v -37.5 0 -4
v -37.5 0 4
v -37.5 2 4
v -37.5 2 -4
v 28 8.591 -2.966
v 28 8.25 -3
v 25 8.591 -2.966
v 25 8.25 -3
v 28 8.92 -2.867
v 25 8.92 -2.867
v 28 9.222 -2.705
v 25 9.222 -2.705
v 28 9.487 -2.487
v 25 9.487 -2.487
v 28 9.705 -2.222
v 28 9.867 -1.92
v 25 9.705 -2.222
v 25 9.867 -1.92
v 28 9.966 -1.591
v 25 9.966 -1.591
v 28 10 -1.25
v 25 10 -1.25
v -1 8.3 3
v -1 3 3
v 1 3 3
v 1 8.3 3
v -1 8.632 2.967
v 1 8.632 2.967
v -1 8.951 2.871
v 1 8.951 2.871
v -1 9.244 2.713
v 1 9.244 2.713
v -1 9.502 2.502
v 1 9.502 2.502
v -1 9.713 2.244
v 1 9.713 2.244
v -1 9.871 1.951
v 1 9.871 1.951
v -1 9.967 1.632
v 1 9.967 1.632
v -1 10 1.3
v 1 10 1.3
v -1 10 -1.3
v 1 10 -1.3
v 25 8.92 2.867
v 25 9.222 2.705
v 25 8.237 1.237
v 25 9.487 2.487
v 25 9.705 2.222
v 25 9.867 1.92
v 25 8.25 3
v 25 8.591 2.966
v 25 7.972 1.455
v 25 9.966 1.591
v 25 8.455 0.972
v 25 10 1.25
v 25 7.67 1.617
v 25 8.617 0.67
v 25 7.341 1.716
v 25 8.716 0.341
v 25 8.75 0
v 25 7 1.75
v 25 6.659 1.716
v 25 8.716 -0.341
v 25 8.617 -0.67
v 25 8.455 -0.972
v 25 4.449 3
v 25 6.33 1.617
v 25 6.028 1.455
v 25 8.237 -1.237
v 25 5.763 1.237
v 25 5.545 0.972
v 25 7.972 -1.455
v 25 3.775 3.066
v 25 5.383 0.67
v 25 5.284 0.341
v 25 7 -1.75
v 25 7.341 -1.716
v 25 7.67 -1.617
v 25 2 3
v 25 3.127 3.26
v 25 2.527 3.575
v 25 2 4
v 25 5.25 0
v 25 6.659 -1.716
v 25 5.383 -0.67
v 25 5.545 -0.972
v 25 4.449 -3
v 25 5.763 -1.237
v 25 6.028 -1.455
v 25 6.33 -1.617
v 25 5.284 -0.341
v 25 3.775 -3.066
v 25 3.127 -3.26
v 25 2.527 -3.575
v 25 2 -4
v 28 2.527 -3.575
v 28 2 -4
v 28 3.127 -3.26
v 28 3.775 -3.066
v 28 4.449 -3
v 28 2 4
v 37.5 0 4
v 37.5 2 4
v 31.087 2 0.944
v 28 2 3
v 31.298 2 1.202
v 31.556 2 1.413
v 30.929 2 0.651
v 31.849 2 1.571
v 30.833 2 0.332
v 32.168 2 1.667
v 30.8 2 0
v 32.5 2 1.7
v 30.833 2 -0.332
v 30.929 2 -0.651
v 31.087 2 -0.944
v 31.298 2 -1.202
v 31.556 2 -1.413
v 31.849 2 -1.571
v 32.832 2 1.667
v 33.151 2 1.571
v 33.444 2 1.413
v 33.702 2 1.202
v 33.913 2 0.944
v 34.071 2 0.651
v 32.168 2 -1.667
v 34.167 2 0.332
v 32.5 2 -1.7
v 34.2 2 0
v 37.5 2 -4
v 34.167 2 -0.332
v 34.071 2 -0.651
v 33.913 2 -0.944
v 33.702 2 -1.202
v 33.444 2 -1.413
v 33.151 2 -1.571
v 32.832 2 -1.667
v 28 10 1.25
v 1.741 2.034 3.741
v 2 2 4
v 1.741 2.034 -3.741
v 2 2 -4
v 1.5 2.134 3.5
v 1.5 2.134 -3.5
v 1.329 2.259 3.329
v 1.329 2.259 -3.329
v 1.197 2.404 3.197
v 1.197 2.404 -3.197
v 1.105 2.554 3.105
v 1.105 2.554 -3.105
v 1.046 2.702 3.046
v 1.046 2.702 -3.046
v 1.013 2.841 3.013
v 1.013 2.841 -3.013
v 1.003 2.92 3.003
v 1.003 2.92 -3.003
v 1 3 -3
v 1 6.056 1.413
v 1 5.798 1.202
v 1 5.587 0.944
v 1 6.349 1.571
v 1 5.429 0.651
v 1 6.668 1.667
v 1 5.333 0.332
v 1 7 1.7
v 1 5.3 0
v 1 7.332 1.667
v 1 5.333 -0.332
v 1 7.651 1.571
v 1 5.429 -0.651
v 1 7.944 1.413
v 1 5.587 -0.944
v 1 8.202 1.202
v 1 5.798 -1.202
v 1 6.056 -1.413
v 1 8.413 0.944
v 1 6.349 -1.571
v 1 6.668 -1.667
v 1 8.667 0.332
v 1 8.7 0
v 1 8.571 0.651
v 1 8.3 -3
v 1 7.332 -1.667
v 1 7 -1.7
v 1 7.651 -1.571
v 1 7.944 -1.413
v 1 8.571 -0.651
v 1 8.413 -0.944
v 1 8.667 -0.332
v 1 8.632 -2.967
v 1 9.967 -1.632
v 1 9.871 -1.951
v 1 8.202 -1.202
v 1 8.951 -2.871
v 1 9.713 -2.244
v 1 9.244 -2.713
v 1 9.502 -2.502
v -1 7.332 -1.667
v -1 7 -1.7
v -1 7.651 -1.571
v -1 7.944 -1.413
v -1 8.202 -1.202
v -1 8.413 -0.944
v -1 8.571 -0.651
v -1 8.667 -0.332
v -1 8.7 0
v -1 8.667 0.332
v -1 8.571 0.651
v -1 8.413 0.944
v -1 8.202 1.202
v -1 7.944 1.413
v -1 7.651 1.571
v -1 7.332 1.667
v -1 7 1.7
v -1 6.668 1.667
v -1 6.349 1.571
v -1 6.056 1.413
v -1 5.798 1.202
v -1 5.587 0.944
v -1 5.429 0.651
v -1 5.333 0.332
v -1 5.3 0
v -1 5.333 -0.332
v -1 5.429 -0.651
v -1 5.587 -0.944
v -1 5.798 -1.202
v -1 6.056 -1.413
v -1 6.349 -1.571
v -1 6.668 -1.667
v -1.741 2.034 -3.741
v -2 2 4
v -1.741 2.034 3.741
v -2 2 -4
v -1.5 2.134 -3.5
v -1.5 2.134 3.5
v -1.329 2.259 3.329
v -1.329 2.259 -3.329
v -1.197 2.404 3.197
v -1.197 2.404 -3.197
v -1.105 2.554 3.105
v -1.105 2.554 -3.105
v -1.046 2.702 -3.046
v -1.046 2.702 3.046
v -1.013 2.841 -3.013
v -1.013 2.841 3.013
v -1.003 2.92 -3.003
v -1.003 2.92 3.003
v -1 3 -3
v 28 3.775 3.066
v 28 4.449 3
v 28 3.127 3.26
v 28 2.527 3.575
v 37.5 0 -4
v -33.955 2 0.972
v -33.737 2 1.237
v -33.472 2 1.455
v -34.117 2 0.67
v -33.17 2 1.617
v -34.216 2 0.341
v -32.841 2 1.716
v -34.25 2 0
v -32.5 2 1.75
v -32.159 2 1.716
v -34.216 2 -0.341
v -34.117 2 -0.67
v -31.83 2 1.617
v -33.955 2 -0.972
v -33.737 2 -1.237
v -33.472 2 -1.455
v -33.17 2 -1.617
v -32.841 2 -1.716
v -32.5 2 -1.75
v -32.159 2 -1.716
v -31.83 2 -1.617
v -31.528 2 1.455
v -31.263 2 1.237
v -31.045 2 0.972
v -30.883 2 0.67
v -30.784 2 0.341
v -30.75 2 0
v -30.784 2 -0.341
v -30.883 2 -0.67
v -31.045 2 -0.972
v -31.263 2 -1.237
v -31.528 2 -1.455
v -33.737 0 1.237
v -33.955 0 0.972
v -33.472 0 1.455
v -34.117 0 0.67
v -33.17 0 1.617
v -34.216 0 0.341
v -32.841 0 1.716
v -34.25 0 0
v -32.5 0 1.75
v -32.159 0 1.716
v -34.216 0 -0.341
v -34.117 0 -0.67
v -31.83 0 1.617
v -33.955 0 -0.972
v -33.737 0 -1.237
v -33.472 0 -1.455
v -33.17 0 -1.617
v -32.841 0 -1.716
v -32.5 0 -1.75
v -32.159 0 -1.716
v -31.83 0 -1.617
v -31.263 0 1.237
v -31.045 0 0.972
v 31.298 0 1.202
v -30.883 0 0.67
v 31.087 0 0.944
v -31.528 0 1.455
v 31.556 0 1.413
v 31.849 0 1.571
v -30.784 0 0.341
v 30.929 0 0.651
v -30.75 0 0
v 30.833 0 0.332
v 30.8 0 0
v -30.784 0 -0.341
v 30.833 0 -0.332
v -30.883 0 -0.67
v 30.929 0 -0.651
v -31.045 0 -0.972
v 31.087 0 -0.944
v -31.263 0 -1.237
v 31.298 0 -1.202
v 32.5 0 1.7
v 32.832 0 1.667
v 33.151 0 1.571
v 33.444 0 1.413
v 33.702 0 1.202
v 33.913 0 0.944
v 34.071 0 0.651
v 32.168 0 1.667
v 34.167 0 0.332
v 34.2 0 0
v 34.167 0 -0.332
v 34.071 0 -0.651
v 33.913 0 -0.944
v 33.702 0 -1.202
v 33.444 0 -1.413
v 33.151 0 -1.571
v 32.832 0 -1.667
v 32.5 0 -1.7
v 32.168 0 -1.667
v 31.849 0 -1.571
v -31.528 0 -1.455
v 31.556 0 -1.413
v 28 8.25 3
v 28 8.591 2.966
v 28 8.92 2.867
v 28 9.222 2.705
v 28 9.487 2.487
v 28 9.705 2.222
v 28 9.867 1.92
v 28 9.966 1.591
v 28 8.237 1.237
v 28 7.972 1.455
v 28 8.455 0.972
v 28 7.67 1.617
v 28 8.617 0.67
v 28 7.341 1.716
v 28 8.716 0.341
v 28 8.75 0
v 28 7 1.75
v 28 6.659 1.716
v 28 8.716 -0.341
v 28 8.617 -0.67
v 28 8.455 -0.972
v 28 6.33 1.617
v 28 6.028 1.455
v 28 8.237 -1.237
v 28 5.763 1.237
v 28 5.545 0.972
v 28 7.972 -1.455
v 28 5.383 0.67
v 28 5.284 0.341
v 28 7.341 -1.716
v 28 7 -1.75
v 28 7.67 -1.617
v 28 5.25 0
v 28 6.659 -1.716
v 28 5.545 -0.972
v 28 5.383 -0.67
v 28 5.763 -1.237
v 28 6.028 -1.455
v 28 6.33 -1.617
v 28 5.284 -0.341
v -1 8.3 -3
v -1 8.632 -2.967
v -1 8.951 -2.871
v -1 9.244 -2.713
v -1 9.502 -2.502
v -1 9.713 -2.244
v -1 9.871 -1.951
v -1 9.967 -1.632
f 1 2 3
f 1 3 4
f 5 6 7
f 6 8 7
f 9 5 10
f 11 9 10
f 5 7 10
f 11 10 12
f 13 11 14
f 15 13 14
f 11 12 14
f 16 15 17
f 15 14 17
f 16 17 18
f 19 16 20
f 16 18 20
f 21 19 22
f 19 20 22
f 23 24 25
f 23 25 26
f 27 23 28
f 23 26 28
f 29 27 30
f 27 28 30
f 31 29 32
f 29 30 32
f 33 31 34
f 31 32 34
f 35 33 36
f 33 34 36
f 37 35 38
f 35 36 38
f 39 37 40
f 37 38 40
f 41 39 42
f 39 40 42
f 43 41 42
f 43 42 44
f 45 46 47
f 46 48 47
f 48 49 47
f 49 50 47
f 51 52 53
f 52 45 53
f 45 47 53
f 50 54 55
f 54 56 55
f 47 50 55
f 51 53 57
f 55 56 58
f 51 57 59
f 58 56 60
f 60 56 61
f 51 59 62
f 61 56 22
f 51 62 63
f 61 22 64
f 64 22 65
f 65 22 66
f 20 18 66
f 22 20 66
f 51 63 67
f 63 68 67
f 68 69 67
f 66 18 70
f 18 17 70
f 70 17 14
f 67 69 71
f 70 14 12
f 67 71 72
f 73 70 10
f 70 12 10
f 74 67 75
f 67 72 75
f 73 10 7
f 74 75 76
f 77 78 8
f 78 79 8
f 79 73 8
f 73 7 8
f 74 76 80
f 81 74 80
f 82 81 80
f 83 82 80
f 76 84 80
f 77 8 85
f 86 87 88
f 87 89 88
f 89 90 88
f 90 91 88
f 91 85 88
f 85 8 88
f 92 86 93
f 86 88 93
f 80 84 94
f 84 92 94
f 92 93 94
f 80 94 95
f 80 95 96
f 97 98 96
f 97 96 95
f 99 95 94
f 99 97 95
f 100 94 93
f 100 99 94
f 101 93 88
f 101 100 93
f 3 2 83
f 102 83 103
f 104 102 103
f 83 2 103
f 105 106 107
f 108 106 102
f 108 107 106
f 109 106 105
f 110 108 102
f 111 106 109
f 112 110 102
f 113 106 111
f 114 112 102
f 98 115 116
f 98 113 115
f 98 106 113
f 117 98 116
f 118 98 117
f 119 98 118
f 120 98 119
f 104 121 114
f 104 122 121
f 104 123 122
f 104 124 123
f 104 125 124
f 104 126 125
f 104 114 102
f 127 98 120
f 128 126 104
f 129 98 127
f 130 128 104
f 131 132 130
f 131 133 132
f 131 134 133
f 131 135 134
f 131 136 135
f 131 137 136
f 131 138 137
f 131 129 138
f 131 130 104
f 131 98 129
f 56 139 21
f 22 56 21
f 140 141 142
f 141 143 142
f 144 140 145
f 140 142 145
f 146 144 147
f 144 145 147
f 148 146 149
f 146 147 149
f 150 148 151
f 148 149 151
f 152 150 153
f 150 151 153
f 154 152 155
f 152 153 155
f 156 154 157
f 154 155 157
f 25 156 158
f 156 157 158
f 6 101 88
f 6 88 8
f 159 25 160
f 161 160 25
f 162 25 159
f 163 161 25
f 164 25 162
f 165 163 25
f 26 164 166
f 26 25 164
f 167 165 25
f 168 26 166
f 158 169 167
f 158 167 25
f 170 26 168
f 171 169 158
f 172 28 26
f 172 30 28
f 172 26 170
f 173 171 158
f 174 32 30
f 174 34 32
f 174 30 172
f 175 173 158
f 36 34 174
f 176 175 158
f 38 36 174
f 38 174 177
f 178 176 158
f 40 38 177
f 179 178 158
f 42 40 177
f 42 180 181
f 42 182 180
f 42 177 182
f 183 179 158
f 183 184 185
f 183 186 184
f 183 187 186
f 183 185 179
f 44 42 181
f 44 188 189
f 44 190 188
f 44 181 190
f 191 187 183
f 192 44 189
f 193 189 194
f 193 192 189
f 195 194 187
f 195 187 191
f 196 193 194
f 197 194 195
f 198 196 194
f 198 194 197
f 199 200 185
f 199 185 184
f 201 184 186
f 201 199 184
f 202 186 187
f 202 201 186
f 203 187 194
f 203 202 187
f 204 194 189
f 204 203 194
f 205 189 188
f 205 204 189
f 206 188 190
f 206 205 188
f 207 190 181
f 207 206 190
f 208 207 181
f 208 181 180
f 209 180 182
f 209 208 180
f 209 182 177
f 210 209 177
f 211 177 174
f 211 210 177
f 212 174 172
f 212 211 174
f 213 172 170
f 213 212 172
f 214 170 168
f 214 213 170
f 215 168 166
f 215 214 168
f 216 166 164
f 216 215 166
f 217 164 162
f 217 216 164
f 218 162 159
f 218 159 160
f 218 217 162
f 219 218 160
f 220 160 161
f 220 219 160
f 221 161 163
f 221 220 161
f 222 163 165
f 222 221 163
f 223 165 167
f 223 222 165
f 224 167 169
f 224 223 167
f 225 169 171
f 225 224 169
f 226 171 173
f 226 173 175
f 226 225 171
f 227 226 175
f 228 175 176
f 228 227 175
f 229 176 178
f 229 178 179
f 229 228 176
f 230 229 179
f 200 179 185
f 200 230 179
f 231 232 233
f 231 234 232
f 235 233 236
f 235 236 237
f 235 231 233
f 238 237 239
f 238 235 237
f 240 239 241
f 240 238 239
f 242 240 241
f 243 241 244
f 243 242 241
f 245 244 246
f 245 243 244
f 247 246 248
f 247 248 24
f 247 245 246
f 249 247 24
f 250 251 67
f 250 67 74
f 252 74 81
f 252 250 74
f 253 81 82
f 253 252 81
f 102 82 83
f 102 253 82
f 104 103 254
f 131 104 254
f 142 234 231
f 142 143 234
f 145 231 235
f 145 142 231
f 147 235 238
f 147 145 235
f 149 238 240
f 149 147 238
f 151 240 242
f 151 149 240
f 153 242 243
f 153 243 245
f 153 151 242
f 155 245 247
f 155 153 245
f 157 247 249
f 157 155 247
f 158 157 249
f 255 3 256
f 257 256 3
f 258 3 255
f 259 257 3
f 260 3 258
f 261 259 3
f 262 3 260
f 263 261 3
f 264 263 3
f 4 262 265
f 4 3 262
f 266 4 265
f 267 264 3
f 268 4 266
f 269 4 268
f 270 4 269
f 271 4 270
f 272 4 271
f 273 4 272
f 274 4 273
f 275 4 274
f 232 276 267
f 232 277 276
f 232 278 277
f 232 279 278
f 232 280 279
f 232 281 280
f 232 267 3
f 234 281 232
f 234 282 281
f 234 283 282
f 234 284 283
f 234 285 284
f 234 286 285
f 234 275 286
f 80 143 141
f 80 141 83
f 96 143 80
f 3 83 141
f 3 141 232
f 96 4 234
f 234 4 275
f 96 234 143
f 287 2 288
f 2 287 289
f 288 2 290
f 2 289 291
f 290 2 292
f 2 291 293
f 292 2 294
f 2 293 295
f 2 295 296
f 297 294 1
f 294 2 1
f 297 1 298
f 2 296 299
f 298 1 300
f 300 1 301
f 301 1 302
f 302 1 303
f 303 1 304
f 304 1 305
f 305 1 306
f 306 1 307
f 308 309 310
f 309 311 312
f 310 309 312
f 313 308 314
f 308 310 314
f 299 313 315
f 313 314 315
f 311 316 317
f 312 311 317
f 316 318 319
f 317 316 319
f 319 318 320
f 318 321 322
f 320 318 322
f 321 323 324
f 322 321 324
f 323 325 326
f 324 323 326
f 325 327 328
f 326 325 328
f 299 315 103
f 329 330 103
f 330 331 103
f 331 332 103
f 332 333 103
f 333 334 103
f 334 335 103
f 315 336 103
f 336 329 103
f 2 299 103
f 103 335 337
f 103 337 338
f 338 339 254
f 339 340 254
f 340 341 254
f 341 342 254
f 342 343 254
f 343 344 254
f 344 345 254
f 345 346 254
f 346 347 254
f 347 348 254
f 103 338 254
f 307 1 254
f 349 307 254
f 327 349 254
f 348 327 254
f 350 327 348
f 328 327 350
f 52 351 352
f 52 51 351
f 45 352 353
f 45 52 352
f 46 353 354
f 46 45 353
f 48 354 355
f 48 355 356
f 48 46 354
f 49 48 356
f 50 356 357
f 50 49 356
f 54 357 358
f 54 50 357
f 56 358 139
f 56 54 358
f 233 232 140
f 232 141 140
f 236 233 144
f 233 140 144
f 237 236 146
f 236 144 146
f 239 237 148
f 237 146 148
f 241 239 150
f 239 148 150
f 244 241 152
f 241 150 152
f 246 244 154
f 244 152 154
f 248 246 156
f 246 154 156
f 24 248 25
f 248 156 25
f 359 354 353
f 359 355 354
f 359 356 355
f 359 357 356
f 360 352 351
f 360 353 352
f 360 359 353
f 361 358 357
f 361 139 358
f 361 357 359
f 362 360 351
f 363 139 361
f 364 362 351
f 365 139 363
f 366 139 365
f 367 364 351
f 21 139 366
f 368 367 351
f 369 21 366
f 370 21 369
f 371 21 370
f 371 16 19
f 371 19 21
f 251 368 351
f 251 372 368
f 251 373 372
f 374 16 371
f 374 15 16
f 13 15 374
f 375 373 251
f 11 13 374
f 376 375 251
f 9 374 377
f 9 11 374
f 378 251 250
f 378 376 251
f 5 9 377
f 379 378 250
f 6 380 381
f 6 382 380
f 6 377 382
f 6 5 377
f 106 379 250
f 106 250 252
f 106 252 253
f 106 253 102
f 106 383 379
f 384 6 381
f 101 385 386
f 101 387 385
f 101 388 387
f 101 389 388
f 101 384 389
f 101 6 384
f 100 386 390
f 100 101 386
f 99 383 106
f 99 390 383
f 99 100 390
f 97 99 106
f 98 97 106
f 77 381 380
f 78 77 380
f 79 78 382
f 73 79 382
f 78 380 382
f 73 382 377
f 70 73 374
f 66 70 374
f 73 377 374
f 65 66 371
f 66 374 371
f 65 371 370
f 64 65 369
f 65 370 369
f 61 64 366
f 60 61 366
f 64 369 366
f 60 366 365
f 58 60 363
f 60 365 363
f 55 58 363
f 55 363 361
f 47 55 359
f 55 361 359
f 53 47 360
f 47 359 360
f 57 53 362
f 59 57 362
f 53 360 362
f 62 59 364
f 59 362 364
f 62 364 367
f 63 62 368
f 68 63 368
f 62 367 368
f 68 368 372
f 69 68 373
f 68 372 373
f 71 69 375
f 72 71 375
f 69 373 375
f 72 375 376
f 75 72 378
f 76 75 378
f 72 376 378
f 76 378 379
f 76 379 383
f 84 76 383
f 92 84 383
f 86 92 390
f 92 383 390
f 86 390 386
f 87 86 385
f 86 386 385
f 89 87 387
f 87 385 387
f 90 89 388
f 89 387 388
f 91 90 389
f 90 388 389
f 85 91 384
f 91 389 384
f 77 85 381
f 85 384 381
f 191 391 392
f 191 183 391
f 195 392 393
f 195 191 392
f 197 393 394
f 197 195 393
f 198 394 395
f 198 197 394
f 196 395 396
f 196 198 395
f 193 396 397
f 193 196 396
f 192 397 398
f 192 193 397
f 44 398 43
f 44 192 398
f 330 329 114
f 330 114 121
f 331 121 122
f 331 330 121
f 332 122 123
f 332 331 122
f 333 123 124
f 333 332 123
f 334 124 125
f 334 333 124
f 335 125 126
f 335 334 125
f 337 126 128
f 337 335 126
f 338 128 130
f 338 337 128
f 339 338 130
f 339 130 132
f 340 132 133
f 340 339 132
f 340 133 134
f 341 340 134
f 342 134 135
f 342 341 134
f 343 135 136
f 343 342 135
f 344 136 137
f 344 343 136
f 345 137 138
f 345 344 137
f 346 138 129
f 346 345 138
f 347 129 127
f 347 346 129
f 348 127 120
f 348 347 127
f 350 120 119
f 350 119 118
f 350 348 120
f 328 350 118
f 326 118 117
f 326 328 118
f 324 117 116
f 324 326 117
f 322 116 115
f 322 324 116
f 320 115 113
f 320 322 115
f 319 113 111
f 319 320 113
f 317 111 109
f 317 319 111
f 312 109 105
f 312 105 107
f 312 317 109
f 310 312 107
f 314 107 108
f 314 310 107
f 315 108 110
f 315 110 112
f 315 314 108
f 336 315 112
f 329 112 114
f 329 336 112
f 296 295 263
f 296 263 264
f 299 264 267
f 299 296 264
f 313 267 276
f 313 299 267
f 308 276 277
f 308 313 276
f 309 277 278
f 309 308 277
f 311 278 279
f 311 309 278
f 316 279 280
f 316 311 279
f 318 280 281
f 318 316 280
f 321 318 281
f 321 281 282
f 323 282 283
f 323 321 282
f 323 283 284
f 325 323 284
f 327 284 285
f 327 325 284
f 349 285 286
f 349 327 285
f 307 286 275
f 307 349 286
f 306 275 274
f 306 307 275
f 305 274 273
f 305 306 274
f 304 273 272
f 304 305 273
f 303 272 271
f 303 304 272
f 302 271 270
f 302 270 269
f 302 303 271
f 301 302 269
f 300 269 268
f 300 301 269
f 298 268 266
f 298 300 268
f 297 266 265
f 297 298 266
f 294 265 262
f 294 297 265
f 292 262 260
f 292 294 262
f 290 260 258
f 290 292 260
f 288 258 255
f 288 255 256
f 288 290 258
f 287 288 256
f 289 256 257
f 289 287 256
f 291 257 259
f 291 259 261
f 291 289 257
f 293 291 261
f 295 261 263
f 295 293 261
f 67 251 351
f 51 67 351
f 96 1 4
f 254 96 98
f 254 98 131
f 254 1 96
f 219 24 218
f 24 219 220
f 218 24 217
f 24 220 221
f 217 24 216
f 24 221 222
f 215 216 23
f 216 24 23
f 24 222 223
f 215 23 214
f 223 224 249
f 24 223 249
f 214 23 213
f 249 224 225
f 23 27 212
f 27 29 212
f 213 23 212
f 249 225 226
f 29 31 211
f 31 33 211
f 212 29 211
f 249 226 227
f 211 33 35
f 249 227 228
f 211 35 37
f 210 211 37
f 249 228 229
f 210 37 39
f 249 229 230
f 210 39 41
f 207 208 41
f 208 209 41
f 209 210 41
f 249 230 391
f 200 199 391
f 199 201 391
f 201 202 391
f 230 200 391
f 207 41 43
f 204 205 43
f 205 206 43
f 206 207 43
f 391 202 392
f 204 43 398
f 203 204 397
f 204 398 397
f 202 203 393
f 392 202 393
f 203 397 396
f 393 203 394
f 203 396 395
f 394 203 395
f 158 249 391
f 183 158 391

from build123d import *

# Parameters (mm, degrees)
SKETCH_1_W           = 75
SKETCH_1_H           = 8
SKETCH_1_R           = 1.75
SKETCH_1_R_2         = 1.7
EXTRUDE_1_DEPTH      = 2
EXTRUDE_2_DEPTH      = 1
EXTRUDE_2_DEPTH_BACK = 1
SKETCH_2_W           = 6
SKETCH_2_H           = 8
SKETCH_2_R           = 1.7
FILLET_2_R           = 1
FILLET_3_R           = 1.7
SKETCH_3_W           = 6
SKETCH_3_H           = 8
SKETCH_3_R           = 1.75
EXTRUDE_3_DEPTH      = 3
FILLET_6_R           = 1.75
FILLET_7_R           = 3.5


# Some blends are built 0.0001 mm under size
with BuildPart() as part:
    # 草图1 → 凸台-拉伸1 (new body)
    with BuildSketch(Plane(origin=(0, 0, 0), x_dir=(1, 0, 0), z_dir=(0, 1, 0))):
        Rectangle(SKETCH_1_W, SKETCH_1_H)
        with Locations(Location((-32.5, 0, 0), (0, 0, 270))):
            Circle(SKETCH_1_R, mode=Mode.SUBTRACT)
        with Locations(Location((32.5, 0, 0), (0, 0, 270))):
            Circle(SKETCH_1_R_2, mode=Mode.SUBTRACT)
    extrude(amount=EXTRUDE_1_DEPTH)

    # 草图2 → 凸台-拉伸2 (add, two sides: drawn at the far end of the back side and taken through both)
    with BuildSketch(Plane(origin=(0, 0, 0), x_dir=(0, 0, -1), z_dir=(1, 0, 0)).offset(-EXTRUDE_2_DEPTH_BACK)):
        with Locations((0, 6)):
            Rectangle(SKETCH_2_W, SKETCH_2_H)
        with Locations((0, 7)):
            Circle(SKETCH_2_R, mode=Mode.SUBTRACT)
    extrude(amount=EXTRUDE_2_DEPTH + EXTRUDE_2_DEPTH_BACK)

    # 圆角2
    fillet_2_edges = [part.edges().sort_by_distance(p)[0] for p in [
        (0, 2, -3),
        (-1, 2, 0),
        (0, 2, 3),
        (1, 2, 0),
    ]]
    fillet(fillet_2_edges, radius=FILLET_2_R - 0.0001)  # a hair under: the kernel refuses the full size

    # 圆角3
    fillet_3_edges = [part.edges().sort_by_distance(p)[0] for p in [
        (0, 10, -3),
        (0, 10, 3),
    ]]
    fillet(fillet_3_edges, radius=FILLET_3_R)

    # 草图3 → 凸台-拉伸3 (add)
    with BuildSketch(Plane(origin=(28, 0, 0), x_dir=(0, 0, -1), z_dir=(1, 0, 0))):
        with Locations((0, 6)):
            Rectangle(SKETCH_3_W, SKETCH_3_H)
        with Locations((0, 7)):
            Circle(SKETCH_3_R, mode=Mode.SUBTRACT)
    extrude(amount=-EXTRUDE_3_DEPTH)

    # 圆角6
    fillet_6_edges = [part.edges().sort_by_distance(p)[0] for p in [
        (26.5, 10, -3),
        (26.5, 10, 3),
    ]]
    fillet(fillet_6_edges, radius=FILLET_6_R)

    # 圆角7
    # the kernel refuses this fillet: 3.5 mm, written as the material it adds along each edge
    with BuildSketch(Plane(origin=(28, 2, -3), x_dir=(0, 0, -1), z_dir=(-1, 0, 0))) as fillet_7_piece_1:
        with BuildLine():
            CenterArc((3.5, -2.449489743), FILLET_7_R, 135.584691403, 44.415308597)
            Line((0, -2.449489743), (-0.07, -2.449489743))
            Line((-0.07, -2.449489743), (-0.07, 0))
            Line((-0.07, 0), (0, 0.07))
            ThreePointArc((0, 0.07), (0.5, 0.07), (0.95, 0.048989795))
            Line((0.95, 0.048989795), (1, 0))
        make_face()
    extrude(amount=3)
    with BuildSketch(Plane(origin=(28, 2, 3), x_dir=(0, 1, 0), z_dir=(-1, 0, 0))) as fillet_7_piece_2:
        with BuildLine():
            CenterArc((2.449489743, -3.5), FILLET_7_R, 90, 44.415308597)
            Line((0, -1), (-0.048989795, -0.95))
            ThreePointArc((-0.048989795, -0.95), (-0.07, -0.5), (-0.07, 0))
            Line((-0.07, 0), (0, 0.07))
            Line((0, 0.07), (2.449489743, 0.07))
            Line((2.449489743, 0.07), (2.449489743, 0))
        make_face()
    extrude(amount=3)


solid = part.part
